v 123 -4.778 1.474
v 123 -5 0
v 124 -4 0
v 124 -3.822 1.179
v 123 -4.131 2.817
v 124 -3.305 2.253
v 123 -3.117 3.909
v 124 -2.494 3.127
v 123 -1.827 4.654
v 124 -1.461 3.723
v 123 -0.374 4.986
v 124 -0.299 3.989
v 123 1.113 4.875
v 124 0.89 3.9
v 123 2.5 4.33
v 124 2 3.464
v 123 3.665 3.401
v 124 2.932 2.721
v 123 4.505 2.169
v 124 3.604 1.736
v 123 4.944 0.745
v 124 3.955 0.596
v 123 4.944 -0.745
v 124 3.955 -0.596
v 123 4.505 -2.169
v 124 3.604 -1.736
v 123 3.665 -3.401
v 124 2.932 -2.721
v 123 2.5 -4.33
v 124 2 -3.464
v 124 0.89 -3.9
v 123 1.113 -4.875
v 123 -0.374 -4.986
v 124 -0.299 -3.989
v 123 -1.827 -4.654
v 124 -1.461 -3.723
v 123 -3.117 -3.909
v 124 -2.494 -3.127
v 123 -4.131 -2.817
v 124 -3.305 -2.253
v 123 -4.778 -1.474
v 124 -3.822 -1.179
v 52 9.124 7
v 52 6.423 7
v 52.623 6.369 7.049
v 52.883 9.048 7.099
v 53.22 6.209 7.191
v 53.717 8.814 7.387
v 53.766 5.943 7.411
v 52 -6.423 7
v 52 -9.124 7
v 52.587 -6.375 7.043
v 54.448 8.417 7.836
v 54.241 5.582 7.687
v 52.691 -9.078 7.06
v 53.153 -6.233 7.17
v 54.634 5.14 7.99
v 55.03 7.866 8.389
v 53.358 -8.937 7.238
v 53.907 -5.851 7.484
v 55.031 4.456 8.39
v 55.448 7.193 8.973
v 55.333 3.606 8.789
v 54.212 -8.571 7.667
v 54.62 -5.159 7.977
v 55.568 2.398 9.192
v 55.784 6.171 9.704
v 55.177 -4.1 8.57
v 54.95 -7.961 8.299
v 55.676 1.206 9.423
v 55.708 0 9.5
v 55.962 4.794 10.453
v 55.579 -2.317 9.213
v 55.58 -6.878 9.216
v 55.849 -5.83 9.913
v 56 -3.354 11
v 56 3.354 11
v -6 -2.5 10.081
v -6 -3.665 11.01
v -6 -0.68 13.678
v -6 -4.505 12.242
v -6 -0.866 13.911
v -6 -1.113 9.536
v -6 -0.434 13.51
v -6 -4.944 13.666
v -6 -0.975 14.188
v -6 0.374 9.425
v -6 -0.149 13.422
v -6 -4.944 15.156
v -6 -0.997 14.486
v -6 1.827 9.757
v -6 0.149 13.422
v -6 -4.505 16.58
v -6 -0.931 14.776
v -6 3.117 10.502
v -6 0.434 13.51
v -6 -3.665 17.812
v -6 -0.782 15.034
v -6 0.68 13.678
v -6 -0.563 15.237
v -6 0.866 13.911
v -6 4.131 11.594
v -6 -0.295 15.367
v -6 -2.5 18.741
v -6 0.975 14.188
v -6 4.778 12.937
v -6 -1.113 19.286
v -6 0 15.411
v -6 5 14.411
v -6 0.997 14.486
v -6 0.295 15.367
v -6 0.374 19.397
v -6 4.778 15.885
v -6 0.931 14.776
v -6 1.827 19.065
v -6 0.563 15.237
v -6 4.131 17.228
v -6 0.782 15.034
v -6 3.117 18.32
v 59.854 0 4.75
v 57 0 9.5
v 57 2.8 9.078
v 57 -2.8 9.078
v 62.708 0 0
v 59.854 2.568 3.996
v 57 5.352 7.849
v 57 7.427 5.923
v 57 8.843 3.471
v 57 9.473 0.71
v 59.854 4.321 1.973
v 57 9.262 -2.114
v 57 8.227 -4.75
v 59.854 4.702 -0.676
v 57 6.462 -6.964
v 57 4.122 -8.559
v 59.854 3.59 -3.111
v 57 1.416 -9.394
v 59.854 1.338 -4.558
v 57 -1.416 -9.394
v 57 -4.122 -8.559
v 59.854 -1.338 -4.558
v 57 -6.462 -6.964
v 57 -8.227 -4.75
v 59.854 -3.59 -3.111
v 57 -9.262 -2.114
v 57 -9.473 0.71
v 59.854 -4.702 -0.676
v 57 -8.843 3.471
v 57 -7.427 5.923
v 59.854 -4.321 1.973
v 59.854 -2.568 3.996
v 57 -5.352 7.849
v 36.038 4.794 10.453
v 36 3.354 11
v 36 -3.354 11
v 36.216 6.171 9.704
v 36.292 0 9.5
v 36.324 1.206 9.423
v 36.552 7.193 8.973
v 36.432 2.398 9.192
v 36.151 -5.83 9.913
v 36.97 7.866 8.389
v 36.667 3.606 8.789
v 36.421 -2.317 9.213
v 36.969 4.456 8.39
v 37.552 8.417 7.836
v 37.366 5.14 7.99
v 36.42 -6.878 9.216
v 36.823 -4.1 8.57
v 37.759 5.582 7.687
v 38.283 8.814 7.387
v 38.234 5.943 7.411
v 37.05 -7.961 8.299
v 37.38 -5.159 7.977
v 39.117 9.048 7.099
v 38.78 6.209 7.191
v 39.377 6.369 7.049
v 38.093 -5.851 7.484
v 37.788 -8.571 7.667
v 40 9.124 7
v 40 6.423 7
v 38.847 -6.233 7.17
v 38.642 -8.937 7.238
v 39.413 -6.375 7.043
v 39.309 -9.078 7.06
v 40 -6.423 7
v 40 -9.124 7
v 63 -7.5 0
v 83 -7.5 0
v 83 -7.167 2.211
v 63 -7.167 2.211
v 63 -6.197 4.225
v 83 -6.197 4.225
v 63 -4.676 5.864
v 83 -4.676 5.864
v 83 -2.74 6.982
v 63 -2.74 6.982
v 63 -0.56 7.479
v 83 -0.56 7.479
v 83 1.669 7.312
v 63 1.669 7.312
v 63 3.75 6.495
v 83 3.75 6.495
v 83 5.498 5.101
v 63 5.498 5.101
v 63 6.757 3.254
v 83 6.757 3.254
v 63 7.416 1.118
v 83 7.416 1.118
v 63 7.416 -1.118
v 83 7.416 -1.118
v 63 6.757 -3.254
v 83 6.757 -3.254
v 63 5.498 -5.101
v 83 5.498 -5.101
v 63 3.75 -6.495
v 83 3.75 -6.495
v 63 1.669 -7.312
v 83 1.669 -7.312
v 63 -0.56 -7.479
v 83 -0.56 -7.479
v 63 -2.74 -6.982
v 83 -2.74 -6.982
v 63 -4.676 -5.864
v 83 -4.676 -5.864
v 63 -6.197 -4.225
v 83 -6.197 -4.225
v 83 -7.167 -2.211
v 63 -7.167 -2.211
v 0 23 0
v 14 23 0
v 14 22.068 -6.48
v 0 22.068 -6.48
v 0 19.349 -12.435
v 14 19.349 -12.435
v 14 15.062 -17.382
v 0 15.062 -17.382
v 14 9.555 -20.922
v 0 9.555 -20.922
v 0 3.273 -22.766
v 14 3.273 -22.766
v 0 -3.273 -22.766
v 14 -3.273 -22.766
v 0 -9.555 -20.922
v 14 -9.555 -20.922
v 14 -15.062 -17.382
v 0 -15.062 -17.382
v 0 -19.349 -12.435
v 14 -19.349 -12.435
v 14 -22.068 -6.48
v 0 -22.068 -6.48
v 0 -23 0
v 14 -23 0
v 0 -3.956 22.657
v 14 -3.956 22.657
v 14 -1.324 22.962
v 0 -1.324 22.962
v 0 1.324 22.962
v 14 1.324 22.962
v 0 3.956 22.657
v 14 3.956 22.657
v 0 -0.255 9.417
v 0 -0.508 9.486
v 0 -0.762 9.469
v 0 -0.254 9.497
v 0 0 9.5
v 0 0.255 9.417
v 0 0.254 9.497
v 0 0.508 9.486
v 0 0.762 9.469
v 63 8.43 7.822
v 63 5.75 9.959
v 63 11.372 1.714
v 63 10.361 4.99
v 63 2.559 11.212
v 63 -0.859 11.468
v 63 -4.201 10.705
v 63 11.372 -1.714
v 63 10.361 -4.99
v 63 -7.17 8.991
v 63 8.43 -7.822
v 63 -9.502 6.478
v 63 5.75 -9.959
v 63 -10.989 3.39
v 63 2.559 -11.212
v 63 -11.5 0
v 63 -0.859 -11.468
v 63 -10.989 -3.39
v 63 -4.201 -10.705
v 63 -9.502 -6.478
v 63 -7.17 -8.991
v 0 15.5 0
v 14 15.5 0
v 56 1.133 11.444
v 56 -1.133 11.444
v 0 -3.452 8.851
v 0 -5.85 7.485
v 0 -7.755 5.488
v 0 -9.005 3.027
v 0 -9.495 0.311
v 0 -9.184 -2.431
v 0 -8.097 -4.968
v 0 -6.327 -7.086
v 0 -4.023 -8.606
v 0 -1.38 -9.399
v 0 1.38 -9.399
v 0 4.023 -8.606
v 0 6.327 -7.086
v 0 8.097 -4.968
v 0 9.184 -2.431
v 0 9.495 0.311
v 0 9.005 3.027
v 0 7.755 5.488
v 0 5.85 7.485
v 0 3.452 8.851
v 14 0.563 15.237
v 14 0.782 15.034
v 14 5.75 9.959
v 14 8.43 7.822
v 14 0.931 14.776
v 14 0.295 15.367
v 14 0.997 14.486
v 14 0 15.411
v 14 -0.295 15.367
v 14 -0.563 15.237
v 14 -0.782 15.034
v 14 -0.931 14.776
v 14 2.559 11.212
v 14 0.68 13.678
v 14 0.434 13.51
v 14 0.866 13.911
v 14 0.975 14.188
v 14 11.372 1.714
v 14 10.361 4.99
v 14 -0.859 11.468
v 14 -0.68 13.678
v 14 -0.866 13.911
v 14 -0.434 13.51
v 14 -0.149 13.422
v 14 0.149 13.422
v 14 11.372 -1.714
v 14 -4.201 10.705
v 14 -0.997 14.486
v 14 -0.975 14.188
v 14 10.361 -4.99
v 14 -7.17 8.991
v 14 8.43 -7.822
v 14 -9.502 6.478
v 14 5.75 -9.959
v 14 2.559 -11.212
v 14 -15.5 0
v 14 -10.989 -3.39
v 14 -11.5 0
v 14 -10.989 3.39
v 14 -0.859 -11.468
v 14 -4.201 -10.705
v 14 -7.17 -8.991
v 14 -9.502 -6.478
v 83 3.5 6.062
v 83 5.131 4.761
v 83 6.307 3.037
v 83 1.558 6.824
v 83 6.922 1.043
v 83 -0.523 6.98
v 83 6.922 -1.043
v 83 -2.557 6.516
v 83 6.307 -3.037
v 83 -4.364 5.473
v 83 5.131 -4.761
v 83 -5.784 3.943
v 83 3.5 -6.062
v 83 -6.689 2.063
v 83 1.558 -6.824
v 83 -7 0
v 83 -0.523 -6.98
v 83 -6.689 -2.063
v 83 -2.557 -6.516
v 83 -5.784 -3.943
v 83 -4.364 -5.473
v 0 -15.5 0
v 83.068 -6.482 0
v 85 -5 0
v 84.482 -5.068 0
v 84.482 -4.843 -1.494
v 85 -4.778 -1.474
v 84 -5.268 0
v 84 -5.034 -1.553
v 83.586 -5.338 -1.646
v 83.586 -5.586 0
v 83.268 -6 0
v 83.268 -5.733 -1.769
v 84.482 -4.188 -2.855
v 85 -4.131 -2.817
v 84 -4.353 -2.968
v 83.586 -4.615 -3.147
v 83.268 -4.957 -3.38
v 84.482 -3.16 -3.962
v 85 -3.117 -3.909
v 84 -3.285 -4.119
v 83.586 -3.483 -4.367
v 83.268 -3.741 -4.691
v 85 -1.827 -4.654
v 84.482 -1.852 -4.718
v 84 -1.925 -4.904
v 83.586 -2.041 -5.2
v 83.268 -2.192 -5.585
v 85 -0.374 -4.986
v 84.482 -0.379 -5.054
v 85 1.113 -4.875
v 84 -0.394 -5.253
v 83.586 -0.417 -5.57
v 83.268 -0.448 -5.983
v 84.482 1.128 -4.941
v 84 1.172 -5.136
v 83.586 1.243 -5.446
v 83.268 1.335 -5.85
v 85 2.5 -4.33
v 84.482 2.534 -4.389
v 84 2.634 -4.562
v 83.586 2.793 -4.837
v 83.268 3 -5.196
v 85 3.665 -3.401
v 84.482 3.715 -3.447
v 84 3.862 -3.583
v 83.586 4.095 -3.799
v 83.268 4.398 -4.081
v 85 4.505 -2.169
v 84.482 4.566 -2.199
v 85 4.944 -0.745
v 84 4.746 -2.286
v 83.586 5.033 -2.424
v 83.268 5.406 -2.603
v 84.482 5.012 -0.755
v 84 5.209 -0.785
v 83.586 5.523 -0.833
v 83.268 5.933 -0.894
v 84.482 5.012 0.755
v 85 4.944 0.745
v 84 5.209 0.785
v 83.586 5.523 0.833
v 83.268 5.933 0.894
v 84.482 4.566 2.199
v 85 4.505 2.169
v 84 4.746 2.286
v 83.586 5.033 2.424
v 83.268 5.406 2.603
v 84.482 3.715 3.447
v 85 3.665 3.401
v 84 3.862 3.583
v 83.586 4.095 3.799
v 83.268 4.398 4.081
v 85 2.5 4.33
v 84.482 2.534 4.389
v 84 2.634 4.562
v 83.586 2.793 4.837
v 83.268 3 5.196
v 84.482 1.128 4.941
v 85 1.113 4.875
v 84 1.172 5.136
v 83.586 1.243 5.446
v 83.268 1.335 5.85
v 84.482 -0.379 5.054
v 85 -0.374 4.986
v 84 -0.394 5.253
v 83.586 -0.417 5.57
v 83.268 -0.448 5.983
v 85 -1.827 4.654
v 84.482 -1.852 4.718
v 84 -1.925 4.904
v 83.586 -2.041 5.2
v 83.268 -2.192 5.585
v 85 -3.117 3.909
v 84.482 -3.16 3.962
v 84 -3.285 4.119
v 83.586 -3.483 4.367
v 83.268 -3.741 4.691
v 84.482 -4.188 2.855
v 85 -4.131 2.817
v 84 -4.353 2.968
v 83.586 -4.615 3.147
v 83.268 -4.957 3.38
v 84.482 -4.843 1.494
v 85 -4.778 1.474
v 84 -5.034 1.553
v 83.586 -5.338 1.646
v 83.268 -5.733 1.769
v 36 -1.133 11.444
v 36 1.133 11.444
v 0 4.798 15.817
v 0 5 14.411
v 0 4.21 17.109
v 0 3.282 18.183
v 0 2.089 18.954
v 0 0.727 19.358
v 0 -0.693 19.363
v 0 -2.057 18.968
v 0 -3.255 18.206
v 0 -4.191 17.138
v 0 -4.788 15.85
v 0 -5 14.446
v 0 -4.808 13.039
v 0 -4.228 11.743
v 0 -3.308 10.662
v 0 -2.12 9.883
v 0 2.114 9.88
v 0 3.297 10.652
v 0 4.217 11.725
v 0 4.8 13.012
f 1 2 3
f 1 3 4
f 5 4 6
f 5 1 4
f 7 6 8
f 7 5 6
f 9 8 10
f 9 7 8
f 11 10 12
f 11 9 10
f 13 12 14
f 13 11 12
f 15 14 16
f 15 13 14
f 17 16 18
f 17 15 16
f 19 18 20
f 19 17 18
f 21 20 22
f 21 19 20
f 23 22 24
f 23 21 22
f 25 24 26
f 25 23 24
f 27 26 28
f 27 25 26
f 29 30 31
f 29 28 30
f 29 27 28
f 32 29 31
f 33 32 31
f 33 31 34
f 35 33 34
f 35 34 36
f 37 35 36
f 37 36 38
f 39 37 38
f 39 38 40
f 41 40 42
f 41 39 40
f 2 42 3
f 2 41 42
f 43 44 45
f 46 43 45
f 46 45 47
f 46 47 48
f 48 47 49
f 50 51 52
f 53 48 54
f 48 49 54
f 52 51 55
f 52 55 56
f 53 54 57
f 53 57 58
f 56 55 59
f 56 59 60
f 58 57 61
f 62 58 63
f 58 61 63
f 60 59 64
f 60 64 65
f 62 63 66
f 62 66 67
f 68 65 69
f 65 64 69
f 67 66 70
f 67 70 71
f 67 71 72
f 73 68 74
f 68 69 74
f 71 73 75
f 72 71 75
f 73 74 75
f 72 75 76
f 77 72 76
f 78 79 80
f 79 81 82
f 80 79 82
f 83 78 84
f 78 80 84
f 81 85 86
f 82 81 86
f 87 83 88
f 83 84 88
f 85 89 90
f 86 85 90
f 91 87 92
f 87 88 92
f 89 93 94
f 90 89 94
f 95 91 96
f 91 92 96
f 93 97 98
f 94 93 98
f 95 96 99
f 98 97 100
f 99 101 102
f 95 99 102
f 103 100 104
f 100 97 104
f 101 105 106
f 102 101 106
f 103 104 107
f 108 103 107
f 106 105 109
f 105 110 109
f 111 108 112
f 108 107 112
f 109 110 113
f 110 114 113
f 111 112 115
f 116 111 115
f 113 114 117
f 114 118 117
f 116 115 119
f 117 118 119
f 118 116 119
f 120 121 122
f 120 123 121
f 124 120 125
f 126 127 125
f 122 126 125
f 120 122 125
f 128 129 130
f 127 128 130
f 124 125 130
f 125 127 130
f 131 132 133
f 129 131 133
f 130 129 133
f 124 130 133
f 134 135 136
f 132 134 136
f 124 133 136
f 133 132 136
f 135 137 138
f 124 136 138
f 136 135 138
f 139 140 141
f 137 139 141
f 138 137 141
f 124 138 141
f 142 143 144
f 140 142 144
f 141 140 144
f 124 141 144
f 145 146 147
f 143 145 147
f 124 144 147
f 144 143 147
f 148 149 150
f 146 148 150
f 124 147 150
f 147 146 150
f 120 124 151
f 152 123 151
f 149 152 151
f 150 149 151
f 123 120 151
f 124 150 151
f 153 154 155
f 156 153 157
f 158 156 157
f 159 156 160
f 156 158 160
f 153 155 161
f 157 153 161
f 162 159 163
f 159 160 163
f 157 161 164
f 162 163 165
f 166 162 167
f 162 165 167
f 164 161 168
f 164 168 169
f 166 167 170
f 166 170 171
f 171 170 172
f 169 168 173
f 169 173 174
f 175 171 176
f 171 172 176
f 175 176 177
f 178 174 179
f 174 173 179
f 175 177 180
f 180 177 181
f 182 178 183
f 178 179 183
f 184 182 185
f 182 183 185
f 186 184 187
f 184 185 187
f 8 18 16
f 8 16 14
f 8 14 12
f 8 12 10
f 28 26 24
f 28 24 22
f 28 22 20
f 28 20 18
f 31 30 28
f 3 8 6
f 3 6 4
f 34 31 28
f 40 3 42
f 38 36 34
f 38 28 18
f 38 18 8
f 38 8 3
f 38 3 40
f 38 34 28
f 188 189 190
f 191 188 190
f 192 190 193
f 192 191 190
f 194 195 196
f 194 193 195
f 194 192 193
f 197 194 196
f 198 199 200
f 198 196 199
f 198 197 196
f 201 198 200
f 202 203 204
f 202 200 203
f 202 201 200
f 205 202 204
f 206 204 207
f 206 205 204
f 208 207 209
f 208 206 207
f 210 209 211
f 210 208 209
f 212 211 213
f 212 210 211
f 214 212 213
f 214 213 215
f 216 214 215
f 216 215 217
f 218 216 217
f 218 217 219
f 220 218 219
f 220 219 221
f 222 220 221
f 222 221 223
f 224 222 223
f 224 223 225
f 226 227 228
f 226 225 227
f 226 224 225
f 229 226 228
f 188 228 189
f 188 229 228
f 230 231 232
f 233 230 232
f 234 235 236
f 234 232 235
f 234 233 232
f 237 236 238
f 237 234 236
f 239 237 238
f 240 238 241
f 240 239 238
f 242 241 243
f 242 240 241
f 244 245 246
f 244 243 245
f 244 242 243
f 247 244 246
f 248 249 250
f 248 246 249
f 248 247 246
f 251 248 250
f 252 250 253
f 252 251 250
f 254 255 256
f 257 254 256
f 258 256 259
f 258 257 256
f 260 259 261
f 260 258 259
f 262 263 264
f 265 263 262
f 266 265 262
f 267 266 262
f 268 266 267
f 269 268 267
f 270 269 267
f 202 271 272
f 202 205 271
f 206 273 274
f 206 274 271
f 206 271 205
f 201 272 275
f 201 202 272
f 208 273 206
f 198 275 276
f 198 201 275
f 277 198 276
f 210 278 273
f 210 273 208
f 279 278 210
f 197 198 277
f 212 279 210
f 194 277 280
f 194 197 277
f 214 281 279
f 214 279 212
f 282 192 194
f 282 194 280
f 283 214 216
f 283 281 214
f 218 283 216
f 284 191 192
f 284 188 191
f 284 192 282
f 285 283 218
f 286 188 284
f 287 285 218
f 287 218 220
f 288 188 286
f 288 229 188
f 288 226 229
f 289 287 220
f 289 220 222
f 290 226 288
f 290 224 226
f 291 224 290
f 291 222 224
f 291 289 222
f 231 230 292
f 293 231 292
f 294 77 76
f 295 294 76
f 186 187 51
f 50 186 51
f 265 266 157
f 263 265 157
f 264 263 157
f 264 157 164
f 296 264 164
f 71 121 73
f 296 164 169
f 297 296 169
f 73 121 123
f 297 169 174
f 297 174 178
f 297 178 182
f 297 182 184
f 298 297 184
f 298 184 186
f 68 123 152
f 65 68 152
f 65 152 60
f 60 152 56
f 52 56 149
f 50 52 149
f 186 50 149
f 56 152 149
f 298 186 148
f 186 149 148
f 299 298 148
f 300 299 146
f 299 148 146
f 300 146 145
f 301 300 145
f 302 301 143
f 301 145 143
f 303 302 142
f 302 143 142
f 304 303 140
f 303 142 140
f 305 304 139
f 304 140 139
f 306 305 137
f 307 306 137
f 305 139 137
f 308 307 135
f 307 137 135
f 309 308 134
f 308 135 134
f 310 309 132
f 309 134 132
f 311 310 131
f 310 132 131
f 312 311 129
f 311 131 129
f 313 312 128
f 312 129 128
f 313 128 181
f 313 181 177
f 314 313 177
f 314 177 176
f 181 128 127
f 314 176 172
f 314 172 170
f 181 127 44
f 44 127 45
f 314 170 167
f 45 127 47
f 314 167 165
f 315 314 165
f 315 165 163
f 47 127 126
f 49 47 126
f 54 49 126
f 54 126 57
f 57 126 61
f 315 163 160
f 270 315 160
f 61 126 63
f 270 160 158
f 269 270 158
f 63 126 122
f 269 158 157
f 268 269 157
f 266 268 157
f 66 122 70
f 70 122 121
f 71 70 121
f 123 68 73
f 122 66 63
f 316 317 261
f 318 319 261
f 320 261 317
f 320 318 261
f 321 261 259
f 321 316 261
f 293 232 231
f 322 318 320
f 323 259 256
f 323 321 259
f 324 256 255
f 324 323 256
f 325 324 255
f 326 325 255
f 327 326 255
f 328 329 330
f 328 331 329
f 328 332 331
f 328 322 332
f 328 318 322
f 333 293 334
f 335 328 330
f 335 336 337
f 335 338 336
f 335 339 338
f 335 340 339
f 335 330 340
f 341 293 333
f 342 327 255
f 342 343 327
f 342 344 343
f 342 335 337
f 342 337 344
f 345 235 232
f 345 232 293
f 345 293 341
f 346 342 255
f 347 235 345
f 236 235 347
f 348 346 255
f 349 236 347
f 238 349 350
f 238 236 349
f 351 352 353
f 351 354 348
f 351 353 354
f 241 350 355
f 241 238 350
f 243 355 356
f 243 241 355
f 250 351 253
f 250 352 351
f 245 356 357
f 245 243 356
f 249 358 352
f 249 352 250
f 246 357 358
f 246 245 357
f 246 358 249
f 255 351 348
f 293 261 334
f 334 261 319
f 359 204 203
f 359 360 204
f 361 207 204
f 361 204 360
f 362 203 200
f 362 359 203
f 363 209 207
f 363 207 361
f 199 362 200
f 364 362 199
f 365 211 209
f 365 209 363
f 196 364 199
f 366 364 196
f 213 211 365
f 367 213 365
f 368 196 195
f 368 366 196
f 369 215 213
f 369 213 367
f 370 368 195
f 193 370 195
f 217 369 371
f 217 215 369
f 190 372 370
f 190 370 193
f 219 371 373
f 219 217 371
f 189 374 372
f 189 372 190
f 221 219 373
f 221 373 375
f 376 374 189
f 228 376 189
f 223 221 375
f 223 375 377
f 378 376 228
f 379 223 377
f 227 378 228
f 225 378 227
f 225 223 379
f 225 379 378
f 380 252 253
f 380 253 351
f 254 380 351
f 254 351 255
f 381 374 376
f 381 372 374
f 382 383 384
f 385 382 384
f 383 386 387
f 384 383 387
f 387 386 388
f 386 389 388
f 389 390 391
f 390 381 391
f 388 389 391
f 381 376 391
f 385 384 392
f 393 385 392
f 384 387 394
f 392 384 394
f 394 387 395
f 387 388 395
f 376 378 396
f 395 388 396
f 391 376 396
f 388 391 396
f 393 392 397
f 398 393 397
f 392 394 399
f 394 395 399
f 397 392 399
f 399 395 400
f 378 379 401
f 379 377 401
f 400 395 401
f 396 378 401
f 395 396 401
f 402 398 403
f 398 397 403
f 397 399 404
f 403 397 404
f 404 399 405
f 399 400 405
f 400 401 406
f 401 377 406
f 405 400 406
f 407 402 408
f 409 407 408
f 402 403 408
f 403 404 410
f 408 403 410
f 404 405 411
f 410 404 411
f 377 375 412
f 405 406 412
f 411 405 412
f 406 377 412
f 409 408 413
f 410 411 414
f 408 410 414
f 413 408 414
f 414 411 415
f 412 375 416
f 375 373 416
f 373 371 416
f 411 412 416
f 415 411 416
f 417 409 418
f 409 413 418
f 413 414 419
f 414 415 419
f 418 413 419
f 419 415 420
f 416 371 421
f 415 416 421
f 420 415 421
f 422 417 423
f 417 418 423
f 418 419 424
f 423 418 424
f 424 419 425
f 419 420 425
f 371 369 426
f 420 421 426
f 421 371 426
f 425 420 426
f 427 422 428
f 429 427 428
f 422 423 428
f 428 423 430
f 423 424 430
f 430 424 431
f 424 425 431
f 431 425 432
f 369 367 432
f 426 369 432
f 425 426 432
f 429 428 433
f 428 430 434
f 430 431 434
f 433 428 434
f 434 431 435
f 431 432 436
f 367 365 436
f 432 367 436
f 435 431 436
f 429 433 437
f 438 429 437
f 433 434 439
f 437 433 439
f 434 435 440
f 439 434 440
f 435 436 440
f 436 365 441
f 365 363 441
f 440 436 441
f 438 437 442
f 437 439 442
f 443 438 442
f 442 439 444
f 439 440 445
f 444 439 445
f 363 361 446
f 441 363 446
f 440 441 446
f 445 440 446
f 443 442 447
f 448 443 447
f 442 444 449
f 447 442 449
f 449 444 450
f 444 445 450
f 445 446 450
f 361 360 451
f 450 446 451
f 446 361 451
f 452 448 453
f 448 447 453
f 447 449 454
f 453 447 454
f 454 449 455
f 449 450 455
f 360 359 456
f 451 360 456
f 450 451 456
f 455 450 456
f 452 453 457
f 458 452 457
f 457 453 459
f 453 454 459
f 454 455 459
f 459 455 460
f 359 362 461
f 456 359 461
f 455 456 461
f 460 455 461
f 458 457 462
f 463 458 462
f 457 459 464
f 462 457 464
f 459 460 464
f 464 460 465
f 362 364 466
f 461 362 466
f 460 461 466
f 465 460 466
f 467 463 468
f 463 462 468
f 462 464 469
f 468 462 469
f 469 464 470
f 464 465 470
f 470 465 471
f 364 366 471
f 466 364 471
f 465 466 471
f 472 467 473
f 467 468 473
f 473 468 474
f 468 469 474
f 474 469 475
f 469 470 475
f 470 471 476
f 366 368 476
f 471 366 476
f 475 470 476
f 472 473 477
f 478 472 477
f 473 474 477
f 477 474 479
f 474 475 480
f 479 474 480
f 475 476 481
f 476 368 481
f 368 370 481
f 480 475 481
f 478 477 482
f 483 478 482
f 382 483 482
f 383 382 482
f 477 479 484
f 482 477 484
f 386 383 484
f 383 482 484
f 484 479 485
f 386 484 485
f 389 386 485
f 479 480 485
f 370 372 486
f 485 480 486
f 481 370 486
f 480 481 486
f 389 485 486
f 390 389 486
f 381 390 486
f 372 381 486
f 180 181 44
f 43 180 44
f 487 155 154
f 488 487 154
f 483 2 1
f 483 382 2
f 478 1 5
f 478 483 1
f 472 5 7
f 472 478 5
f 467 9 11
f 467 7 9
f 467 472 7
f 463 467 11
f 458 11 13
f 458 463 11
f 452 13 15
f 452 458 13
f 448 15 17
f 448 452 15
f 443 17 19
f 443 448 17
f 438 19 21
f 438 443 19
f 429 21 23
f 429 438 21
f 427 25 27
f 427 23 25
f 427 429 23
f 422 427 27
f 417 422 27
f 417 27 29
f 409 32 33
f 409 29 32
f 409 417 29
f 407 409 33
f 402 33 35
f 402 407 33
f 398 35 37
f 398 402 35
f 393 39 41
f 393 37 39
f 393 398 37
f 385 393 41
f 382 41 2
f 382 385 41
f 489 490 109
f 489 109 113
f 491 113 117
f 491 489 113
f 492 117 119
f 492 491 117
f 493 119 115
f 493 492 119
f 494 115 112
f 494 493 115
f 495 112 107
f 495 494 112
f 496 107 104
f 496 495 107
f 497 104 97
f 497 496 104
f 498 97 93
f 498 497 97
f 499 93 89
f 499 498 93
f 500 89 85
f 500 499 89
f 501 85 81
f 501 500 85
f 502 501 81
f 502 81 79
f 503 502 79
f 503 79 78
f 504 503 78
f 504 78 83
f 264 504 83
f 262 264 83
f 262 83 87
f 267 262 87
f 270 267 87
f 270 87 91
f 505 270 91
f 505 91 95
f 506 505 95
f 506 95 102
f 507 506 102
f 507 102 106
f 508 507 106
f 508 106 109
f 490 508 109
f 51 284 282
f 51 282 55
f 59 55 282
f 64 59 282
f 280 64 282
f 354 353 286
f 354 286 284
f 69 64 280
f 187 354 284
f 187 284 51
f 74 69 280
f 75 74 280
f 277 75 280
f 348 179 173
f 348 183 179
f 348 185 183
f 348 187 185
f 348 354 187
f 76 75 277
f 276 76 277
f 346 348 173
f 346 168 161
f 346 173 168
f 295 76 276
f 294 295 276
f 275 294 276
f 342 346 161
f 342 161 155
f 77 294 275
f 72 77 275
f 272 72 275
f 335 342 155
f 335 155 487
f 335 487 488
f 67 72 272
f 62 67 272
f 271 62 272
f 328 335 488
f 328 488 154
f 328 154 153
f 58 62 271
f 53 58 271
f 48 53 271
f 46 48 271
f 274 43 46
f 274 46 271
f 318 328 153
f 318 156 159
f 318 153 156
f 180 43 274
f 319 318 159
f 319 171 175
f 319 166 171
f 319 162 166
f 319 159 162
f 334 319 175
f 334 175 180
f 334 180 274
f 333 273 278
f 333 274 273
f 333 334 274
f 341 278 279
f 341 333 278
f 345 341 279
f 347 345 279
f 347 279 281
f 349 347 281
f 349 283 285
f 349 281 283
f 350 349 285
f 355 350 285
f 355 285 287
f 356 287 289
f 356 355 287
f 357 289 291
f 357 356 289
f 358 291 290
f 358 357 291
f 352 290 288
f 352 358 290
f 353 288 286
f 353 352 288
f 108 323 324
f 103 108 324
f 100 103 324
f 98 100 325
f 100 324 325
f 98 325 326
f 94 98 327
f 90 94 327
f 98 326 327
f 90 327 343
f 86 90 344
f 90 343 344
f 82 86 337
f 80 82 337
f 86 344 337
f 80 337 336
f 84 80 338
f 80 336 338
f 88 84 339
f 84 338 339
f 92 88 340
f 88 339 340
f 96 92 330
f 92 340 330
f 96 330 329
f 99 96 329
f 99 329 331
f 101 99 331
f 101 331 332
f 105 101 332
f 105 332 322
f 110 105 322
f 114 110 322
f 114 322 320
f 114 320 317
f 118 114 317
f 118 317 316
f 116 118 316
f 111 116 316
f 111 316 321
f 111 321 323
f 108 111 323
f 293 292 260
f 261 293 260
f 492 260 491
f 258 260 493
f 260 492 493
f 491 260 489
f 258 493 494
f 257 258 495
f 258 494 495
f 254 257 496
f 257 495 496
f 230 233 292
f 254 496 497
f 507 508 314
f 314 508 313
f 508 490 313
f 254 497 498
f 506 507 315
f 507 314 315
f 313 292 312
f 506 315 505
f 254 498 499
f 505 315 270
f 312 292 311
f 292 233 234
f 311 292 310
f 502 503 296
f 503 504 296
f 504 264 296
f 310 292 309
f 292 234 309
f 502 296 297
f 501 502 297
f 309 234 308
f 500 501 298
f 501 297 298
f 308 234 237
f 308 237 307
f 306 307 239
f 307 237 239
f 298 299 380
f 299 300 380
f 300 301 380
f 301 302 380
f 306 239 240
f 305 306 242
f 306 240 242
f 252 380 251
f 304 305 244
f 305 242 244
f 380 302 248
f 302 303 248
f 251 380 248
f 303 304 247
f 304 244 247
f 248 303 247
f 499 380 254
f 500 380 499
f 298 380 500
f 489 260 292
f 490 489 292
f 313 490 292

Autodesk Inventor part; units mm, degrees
ref_plane "YZ Plane" through (0, 0, 0) normal (1, 0, 0) x (0, 1, 0)
ref_plane "XZ Plane" through (0, 0, 0) normal (0, 1, 0) x (-1, 0, 0)
ref_plane "XY Plane" through (0, 0, 0) normal (0, 0, 1) x (1, 0, 0)
sketch "Szkic1" plane through (0, 0, 0) normal (0, 0, 1) x (1, 0, 0)
  line L0 (0, 0) -> (14, 0)
  line L1 (14, 0) -> (14, 23)
  line L2 (14, 23) -> (0, 23)
  line L3 (0, 23) -> (0, 0)
  line L4 (14, 0) -> (63, 0)
  line L5 (63, 0) -> (63, 11.5)
  line L6 (63, 11.5) -> (14, 11.5)
  line L7 (14, 11.5) -> (14, 0)
  line L8 (63, 0) -> (83, 0)
  line L9 (83, 0) -> (83, 7.5)
  line L10 (83, 7.5) -> (63, 7.5)
  line L11 (63, 7.5) -> (63, 0)
  line L12 (83, 0) -> (124, 0)
  line L13 (124, 0) -> (124, 5)
  line L14 (124, 5) -> (83, 5)
  line L15 (83, 5) -> (83, 0)
  point P0 (14, 11.5)
  dimension "d0" = 14
  dimension "d1" = 23
  dimension "d2" = 49
  dimension "d3" = 11.5
  dimension "d4" = 20
  dimension "d5" = 7.5
  dimension "d6" = 41
  dimension "d7" = 5
revolve "Obrót1" add sketch "Szkic1" angle 360 mid plane about axis through (14, 0, 0) along (1, 0, 0)
sketch "Szkic2" plane through (0, 0, 0) normal (-1, 0, 0) x (0, 0, 1)
  circle A0 centre (0, 0) radius 23 projected
hole "Otwór1" at (0, 0, 0) direction (1, 0, 0) diameter 19 depth 57 tip angle 118
chamfer "Faza1" distance 1 angle 45 1 edges at (124, 5, 0) measured on face at (124, 0.8193, 0.3214)
fillet "Zaokrąglenie powierzchni1" radius 2 1 edges at (83, 5, 0)
sketch "Szkic3" plane through (0, 0, 0) normal (1, 0, 0) x (0, 1, 0)
  circle A0 centre (0, 0) radius 23 projected
  line L0 (23, 0) -> (15.5, 0)
  line L1 (15.5, 0) -> (3.9555, 22.6573)
  line L2 (-23, 0) -> (-15.5, 0)
  line L3 (-15.5, 0) -> (-3.9555, 22.6573)
  line L4 (-15.5, 0) -> (9.9289, 0) construction
  dimension "d20" = 7.5
  dimension "d21" = 117
  dimension "d22" = 7.5
  dimension "d23" = 63
extrude "Wyciągnięcie proste1" cut sketch "Szkic3" along normal blind 14 contours L0 L1 A0 | A0 L3 L2
sketch "Szkic4" plane through (0, 0, 0) normal (1, 0, 0) x (0, 1, 0)
  circle A0 centre (0, 14.411) radius 5
  point P0 (0, 0)
  dimension "d26" = 10
extrude "Wyciągnięcie proste2" add sketch "Szkic4" against normal blind 6
sketch "Szkic5" plane through (-6, 0, 14.411) normal (-1, 0, 0) x (0, 0, 1)
  point P0 (-14.411, 0)
  point P1 (0, 0)
hole "Otwór2" at (-6, 0, 14.411) direction (1, 0, 0) diameter 2 end through all
sketch "Szkic6" plane through (0, 0, 0) normal (0, 1, 0) x (-1, 0, 0)
  line L0 (-14, 11.5) -> (-63, 11.5) projected
  line L1 (-40, 7) -> (-52, 7)
  line L2 (-56, 11) -> (-56, 11.5)
  line L3 (-56, 11.5) -> (-36, 11.5)
  line L4 (-36, 11.5) -> (-36, 11)
  line L5 (0, 0) -> (0, 22.6573) projected
  arc A0 (-40, 7) -> (-36, 11) centre (-40, 11) ccw
  arc A1 (-56, 11) -> (-52, 7) centre (-52, 11) ccw
  dimension "d36" = 20
  dimension "d37" = 36
  dimension "d38" = 4.5
  dimension "d39" = 4
  dimension "d40" = 4
extrude "Wyciągnięcie proste3" cut sketch "Szkic6" along normal through all both and the other way through all
